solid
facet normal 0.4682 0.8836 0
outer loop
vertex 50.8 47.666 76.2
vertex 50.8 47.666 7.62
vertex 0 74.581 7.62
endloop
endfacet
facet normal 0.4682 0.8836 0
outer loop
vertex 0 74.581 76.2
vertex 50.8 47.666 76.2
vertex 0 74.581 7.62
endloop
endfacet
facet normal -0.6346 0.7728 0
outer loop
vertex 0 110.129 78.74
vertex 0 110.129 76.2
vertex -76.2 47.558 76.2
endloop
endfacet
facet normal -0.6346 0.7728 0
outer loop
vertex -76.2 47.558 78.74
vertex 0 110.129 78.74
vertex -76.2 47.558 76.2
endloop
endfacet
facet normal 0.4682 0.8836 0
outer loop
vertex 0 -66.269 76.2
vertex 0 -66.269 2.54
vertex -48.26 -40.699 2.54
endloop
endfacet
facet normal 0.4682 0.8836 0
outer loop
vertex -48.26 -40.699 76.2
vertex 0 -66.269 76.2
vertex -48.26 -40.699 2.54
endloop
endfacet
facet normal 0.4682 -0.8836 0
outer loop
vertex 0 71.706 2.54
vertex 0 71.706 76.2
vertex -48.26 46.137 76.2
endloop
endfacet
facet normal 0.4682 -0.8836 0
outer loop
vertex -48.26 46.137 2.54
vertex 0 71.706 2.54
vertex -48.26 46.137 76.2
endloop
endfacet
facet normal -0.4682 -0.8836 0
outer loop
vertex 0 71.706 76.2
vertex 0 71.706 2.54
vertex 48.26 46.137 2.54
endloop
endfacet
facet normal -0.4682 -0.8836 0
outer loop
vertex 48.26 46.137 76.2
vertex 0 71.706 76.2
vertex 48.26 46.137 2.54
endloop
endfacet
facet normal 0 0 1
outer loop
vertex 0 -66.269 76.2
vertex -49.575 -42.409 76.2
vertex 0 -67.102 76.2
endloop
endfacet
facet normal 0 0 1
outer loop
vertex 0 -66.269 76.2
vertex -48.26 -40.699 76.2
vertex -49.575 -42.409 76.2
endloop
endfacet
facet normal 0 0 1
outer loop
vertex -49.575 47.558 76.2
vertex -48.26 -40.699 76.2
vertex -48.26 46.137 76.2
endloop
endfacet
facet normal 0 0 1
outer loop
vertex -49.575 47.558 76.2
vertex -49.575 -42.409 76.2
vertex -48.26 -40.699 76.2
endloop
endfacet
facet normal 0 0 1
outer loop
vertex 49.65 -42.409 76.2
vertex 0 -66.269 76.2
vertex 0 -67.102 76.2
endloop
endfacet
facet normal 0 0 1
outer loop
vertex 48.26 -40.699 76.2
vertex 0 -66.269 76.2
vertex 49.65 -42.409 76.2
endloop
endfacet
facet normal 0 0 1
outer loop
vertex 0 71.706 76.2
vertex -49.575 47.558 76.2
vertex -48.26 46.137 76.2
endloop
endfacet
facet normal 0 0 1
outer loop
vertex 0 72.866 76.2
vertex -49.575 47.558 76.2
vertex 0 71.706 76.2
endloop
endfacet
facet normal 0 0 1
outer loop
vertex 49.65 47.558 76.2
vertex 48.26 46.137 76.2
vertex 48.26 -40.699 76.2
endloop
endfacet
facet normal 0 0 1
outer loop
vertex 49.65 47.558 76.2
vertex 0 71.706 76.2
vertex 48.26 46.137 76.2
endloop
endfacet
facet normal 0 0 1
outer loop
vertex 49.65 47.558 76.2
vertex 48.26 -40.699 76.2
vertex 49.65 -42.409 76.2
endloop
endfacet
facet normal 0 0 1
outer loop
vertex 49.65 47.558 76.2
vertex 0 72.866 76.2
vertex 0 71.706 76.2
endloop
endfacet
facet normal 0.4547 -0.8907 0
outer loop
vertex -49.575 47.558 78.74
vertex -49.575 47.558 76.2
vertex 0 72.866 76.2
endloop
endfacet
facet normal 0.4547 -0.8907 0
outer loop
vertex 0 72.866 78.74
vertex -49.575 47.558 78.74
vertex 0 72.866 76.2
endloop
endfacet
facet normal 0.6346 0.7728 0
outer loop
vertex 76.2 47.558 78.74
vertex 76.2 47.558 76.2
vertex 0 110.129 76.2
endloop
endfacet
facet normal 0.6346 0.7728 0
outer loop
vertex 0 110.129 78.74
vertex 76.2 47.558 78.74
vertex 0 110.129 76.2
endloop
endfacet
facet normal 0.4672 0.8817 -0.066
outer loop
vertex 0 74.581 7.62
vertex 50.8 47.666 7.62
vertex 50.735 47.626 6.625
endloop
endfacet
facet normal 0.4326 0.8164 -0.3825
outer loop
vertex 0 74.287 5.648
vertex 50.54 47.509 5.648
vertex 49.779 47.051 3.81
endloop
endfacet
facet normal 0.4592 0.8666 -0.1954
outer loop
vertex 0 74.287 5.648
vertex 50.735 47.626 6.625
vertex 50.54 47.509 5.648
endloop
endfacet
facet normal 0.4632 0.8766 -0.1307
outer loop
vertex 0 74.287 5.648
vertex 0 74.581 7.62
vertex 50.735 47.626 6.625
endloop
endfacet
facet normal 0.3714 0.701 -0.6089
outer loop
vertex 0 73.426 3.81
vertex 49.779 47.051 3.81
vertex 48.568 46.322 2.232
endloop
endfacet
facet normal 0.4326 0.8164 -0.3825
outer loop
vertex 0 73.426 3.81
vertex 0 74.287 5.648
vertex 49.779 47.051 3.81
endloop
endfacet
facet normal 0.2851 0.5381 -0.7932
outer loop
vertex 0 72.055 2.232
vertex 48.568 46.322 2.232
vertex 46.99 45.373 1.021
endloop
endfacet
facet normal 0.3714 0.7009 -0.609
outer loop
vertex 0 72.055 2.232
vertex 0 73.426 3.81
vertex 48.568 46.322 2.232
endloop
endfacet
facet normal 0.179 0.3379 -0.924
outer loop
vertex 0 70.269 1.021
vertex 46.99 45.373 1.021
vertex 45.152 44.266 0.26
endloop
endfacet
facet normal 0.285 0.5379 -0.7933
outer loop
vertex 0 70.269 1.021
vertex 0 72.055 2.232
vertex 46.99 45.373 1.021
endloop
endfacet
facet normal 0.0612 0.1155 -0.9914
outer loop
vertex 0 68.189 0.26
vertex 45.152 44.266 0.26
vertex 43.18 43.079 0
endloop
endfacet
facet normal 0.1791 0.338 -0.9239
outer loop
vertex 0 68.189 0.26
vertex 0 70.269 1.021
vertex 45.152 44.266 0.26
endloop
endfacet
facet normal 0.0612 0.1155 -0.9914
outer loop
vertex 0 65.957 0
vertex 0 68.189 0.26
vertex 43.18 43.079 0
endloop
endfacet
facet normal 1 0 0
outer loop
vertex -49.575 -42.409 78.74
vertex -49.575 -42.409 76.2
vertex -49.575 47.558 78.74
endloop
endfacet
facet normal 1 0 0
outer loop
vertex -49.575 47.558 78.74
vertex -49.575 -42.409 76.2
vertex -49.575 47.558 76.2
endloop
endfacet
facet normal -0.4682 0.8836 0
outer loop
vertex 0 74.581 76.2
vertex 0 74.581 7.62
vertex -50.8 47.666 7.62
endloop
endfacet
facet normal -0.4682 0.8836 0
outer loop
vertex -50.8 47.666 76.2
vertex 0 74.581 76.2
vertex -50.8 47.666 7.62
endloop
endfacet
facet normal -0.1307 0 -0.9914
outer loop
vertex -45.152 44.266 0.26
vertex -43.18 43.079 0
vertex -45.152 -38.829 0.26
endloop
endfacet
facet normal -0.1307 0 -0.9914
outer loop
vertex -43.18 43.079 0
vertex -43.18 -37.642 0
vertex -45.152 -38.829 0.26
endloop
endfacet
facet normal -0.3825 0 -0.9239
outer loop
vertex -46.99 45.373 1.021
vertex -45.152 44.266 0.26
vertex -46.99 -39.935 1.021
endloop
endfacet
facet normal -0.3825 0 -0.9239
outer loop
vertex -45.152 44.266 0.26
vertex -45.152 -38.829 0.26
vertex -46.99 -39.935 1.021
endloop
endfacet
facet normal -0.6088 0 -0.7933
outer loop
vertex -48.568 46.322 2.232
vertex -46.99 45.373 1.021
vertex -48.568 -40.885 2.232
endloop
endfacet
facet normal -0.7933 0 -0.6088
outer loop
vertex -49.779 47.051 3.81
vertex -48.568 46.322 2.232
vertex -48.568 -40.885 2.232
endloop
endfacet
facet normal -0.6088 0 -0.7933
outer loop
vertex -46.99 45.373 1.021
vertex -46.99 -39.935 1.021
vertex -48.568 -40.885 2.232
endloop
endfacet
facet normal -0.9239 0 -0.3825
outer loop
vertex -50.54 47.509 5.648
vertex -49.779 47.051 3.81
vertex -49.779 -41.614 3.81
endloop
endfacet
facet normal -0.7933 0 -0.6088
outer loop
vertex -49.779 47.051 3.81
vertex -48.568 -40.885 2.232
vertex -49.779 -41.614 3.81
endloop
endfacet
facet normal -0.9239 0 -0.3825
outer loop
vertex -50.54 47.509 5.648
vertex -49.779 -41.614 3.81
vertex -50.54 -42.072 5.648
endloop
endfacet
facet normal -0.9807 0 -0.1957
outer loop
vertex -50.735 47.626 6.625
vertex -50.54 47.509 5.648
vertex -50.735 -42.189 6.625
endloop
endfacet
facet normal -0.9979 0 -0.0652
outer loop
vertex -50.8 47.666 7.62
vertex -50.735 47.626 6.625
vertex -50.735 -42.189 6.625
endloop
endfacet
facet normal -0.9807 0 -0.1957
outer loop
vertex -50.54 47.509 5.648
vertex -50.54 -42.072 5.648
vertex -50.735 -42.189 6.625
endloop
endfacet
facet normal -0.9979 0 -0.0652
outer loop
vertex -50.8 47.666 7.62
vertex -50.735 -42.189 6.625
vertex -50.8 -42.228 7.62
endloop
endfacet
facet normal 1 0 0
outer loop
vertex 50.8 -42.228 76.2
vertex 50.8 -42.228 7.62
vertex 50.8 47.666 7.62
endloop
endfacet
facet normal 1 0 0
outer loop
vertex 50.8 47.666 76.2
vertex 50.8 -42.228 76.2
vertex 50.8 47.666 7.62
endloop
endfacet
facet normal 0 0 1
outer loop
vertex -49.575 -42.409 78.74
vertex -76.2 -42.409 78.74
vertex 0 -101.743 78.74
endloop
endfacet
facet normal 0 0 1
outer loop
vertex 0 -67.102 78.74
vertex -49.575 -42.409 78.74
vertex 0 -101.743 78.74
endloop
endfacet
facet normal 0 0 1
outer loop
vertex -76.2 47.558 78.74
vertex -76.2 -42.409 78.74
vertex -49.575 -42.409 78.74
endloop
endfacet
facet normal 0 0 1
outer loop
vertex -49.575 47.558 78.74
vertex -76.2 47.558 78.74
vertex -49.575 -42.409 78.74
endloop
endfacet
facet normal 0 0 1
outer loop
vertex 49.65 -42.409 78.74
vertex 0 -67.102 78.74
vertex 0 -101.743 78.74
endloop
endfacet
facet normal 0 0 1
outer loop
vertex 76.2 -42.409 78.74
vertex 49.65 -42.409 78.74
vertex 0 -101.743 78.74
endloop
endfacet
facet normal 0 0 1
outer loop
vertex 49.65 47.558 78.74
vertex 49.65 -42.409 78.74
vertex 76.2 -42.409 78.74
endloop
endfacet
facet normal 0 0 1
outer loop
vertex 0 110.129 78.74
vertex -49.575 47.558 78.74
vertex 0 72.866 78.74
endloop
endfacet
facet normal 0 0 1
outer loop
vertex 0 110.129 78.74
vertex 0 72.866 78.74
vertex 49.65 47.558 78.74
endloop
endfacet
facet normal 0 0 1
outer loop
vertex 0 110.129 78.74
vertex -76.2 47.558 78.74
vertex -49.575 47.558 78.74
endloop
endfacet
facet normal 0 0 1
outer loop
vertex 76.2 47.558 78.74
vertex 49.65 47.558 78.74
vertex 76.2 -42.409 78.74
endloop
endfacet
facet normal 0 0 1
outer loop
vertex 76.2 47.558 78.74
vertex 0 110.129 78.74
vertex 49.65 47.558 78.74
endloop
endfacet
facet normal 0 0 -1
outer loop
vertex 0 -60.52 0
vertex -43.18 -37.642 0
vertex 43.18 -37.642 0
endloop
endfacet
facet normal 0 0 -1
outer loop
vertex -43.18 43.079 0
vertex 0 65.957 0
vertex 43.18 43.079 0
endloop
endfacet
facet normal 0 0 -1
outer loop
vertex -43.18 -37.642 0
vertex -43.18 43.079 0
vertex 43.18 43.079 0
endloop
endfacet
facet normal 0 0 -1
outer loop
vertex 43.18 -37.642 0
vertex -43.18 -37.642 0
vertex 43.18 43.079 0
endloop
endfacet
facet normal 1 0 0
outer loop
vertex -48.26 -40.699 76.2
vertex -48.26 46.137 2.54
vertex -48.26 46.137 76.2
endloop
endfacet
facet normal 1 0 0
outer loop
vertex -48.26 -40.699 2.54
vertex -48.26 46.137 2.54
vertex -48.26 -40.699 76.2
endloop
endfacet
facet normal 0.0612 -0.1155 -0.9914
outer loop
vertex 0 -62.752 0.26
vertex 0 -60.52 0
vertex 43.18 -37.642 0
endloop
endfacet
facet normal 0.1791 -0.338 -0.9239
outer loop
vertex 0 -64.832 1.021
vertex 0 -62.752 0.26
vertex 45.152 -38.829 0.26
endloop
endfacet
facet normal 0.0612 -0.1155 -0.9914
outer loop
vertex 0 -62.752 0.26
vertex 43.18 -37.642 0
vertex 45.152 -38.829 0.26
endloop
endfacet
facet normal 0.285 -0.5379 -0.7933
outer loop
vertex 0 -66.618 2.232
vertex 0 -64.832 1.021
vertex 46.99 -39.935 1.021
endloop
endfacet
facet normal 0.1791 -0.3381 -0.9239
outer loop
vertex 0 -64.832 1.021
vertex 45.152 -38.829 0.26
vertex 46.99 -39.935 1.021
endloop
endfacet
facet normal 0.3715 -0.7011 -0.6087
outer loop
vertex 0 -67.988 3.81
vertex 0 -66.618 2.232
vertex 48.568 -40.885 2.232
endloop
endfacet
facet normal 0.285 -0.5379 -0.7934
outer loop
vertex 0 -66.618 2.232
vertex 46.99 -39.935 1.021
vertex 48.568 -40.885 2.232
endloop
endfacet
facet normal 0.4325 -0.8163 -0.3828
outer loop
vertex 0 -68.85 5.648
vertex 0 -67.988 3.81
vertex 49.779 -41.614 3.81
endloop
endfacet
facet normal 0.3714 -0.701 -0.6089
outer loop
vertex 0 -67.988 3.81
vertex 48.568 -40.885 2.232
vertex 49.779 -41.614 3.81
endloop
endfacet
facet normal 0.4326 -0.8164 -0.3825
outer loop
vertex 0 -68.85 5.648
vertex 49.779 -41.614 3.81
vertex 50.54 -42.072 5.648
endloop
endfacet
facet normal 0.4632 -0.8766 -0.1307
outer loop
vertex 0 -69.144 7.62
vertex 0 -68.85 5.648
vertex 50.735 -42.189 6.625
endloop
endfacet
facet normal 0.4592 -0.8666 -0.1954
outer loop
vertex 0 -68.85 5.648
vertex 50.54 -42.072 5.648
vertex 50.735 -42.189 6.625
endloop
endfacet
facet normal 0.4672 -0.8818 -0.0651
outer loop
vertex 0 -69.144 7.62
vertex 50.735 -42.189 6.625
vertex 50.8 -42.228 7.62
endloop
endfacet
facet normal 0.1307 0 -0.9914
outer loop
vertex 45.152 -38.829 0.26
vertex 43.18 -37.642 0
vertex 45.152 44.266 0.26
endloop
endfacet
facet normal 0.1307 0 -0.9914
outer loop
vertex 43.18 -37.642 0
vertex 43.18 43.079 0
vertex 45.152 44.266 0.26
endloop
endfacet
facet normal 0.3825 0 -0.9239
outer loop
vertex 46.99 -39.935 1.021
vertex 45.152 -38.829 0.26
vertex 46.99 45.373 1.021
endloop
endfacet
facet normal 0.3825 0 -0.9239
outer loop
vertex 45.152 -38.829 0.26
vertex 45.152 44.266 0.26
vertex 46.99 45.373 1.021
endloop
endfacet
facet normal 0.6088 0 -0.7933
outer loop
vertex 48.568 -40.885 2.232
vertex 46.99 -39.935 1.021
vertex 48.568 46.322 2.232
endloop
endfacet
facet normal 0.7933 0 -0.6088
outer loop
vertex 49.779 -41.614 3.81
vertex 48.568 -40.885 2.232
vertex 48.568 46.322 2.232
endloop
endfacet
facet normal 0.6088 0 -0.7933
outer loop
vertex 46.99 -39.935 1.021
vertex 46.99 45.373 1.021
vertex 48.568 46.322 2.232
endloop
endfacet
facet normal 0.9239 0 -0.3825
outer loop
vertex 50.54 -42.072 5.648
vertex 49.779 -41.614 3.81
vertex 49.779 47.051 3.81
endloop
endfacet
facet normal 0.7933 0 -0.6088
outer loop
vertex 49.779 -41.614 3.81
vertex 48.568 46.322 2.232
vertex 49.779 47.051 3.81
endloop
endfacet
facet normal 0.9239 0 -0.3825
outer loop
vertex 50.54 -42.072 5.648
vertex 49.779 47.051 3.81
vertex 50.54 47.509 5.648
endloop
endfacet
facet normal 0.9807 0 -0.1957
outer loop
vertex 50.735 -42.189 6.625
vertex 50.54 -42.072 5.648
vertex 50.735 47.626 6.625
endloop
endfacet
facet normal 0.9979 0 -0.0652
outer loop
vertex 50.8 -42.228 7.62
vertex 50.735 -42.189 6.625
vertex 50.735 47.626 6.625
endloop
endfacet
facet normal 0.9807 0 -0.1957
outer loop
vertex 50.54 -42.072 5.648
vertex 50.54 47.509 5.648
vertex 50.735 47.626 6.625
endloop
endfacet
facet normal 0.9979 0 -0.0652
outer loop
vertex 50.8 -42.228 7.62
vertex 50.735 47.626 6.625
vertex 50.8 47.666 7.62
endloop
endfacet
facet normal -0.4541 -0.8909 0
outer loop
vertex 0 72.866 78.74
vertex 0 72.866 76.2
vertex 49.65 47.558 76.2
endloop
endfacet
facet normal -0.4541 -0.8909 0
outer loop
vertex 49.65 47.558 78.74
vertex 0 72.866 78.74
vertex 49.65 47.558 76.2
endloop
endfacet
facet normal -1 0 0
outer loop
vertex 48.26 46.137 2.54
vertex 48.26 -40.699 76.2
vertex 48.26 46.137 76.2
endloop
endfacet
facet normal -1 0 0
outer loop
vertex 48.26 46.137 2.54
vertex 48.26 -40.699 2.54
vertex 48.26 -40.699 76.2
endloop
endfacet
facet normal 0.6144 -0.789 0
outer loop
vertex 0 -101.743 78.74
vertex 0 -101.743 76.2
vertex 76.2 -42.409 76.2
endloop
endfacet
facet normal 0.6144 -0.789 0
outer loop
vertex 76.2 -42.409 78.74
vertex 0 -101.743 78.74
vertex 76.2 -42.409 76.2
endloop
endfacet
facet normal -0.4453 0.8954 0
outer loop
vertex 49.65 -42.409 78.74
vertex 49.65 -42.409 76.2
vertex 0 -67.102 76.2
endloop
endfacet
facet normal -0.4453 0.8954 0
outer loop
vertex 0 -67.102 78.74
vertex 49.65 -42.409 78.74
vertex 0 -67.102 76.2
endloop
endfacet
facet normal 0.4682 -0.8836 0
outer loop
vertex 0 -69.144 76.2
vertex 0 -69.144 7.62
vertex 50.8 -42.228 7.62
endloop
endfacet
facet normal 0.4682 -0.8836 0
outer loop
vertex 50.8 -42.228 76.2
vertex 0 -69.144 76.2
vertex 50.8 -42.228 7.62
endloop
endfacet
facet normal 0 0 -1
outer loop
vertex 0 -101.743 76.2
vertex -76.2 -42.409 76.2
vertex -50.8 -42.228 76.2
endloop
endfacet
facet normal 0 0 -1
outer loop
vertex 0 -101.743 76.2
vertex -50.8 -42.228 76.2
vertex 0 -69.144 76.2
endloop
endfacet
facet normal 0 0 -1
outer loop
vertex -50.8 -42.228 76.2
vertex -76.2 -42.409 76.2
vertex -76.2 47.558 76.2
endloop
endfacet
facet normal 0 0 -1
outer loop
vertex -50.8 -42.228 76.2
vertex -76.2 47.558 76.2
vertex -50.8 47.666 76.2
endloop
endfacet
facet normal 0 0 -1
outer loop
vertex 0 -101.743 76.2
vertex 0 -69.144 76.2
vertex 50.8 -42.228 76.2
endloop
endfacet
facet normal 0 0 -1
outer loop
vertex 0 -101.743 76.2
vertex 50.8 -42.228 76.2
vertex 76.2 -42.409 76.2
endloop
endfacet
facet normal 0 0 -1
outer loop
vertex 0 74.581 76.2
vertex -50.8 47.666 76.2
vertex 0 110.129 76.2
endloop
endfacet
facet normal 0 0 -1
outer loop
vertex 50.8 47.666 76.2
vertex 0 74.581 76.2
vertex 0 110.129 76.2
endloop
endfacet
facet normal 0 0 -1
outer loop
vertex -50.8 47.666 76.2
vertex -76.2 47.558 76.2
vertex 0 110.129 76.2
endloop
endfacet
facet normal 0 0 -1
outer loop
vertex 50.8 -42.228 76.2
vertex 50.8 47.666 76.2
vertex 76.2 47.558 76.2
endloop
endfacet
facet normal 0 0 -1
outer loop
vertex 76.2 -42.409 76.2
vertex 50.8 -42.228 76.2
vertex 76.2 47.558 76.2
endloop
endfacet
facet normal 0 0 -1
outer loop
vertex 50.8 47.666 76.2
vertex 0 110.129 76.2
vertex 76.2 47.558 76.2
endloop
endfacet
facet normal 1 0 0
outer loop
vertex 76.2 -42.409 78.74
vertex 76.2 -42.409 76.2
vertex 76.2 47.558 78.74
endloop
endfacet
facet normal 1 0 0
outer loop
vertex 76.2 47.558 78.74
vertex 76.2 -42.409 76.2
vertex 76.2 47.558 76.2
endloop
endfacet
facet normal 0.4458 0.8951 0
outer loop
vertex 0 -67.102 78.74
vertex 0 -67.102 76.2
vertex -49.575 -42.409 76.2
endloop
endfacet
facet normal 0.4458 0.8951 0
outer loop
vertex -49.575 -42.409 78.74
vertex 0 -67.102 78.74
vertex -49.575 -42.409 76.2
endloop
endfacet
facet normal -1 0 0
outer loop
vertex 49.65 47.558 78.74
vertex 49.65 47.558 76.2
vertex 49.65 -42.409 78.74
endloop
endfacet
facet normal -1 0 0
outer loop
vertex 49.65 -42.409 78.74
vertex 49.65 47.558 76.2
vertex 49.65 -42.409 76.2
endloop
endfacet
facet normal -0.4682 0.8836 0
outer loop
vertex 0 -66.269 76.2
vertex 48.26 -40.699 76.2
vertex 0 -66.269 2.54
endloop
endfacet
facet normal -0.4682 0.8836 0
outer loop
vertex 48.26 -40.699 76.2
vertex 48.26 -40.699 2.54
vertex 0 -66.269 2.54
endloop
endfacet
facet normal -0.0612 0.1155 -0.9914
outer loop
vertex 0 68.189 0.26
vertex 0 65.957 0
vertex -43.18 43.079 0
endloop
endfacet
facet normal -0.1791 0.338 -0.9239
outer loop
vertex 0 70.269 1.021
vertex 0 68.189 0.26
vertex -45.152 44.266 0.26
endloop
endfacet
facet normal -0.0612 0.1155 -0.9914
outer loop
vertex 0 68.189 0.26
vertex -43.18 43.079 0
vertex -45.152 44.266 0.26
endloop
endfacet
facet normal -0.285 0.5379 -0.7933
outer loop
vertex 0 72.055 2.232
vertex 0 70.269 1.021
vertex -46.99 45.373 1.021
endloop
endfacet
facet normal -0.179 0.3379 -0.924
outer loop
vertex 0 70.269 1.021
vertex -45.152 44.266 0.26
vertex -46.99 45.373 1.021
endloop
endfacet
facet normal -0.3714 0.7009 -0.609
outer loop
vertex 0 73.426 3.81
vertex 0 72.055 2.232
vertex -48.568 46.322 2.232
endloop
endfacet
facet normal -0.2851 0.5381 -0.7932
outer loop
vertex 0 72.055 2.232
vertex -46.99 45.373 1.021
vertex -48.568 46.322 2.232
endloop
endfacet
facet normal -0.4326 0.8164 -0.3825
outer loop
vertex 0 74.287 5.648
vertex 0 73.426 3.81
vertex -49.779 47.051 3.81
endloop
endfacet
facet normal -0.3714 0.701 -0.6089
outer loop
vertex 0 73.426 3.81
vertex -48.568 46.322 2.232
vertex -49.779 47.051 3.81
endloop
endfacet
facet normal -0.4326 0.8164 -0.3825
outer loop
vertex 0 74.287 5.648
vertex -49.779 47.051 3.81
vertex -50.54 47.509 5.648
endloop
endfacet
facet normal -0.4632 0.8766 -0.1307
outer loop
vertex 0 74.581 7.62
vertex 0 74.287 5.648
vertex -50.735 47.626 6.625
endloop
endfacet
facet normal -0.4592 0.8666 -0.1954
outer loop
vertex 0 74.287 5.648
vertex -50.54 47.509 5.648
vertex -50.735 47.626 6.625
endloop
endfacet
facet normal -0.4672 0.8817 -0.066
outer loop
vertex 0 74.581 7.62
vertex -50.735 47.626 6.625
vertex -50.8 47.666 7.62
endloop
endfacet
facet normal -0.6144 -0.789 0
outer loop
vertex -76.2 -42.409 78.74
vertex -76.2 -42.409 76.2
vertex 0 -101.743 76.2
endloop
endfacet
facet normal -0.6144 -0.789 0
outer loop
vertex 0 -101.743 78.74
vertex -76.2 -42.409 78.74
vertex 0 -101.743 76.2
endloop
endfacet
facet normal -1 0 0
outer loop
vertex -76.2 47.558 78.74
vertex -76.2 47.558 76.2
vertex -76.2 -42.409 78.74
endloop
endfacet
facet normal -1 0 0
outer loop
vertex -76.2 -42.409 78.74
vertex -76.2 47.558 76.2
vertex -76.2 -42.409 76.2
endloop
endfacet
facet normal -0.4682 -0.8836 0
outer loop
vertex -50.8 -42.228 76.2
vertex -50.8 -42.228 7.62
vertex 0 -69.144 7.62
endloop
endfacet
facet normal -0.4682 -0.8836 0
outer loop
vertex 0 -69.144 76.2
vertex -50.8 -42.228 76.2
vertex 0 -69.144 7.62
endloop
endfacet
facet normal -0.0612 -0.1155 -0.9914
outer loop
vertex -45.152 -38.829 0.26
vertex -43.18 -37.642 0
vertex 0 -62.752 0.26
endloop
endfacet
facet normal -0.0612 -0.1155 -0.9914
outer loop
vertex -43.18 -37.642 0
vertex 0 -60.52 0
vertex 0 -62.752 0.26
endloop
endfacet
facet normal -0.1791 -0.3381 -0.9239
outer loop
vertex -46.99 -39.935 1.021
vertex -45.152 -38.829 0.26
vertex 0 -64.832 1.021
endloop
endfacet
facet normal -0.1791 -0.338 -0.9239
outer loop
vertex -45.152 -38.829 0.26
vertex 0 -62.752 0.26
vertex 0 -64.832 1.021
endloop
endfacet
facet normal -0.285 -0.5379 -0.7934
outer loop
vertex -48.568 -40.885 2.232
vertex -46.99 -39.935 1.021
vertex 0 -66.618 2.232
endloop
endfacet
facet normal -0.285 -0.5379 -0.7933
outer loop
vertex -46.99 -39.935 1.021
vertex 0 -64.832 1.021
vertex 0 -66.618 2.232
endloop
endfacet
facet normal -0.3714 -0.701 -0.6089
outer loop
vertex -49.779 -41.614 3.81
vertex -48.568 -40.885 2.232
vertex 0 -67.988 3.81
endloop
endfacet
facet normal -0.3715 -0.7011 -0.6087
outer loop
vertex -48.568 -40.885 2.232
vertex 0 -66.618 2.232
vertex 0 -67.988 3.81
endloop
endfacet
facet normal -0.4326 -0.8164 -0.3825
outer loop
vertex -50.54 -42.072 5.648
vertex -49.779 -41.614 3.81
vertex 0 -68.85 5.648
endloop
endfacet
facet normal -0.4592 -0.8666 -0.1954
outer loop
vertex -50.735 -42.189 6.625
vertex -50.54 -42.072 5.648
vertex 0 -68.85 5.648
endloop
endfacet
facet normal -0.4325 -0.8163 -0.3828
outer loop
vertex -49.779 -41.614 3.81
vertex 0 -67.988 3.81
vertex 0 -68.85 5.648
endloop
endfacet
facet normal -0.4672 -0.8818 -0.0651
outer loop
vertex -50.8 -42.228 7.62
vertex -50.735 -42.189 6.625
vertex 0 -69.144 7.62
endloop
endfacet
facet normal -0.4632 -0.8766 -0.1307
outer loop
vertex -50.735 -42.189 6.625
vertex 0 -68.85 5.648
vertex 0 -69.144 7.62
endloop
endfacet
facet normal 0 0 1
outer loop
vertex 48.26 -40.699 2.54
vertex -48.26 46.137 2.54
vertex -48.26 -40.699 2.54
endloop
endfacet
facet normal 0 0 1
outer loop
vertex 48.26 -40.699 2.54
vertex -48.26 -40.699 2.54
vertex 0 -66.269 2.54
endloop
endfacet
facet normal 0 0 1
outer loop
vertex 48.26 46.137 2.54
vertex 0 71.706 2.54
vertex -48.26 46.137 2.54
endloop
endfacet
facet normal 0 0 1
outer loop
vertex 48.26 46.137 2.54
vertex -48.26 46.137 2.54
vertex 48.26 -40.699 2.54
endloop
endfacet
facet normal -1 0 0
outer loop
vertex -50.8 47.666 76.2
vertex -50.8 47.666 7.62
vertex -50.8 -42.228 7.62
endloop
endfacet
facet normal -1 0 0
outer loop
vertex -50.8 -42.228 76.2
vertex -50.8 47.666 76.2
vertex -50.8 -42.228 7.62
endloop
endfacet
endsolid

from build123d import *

# Parameters (mm, degrees)
F1_DEPTH = 76.2
F4_DEPTH = 2.54
F5_T     = -2.54
F6_R     = 7.62


# Not quite as in the source:
# - a shell that OpenCascade refuses in one call is made with other operations: the cavity is built on its own and cut out


with BuildPart() as f1:
    # F0 (on Top) → F1 (new body)
    with BuildSketch(Plane.XY):
        Polygon((0, -69.1435125567), (0, 74.5809290344), (-50.8, 47.6656096473), (-50.8, -42.2281931696), align=None)
        Polygon((50.8, 47.6656096473), (0, 74.5809290344), (0, -69.1435125567), (50.8, -42.2281931696), align=None)
    extrude(amount=F1_DEPTH)

    # F3 (on offset) → F4 (join)
    with BuildSketch(Plane.XY.offset(76.2)):
        Polygon((76.2, 47.5584119558), (0, 110.1294793168), (-76.2, 47.5584119558), (-76.2, -42.4090027809), (0, -101.7426550388), (76.2, -42.4090027809), align=None)
        Polygon((-49.5749972761, 47.5584119558), (0, 72.8662833571), (49.6499985456, 47.5584119558), (49.6499985456, -42.4090027809), (0, -67.1015977859), (-49.5749972761, -42.4090027809), align=None, mode=Mode.SUBTRACT)
    extrude(amount=F4_DEPTH)

    # F5: a shell. OpenCascade refuses it in one call, so the cavity is built on its own and cut out:
    # the body offset inwards by the wall thickness, plus a prism from it out through each open face.
    f5_core = offset(f1.part, amount=F5_T, mode=Mode.PRIVATE)
    f5_exits = [f5_core.faces().sort_by_distance(p)[0] for p in [
        (0, 2.718708, 73.66),
    ]]
    add(f5_core, mode=Mode.SUBTRACT)
    extrude(f5_exits, amount=-F5_T, mode=Mode.SUBTRACT)

    # F6
    f6_edges = [f1.edges().sort_by_distance(p)[0] for p in [
        (-25.4, 61.123269, 0),
        (-50.8, 2.718708, 0),
        (-25.4, -55.685853, 0),
        (25.4, -55.685853, 0),
        (50.8, 2.718708, 0),
        (25.4, 61.123269, 0),
    ]]
    fillet(f6_edges, radius=F6_R)


solid = f1.part
